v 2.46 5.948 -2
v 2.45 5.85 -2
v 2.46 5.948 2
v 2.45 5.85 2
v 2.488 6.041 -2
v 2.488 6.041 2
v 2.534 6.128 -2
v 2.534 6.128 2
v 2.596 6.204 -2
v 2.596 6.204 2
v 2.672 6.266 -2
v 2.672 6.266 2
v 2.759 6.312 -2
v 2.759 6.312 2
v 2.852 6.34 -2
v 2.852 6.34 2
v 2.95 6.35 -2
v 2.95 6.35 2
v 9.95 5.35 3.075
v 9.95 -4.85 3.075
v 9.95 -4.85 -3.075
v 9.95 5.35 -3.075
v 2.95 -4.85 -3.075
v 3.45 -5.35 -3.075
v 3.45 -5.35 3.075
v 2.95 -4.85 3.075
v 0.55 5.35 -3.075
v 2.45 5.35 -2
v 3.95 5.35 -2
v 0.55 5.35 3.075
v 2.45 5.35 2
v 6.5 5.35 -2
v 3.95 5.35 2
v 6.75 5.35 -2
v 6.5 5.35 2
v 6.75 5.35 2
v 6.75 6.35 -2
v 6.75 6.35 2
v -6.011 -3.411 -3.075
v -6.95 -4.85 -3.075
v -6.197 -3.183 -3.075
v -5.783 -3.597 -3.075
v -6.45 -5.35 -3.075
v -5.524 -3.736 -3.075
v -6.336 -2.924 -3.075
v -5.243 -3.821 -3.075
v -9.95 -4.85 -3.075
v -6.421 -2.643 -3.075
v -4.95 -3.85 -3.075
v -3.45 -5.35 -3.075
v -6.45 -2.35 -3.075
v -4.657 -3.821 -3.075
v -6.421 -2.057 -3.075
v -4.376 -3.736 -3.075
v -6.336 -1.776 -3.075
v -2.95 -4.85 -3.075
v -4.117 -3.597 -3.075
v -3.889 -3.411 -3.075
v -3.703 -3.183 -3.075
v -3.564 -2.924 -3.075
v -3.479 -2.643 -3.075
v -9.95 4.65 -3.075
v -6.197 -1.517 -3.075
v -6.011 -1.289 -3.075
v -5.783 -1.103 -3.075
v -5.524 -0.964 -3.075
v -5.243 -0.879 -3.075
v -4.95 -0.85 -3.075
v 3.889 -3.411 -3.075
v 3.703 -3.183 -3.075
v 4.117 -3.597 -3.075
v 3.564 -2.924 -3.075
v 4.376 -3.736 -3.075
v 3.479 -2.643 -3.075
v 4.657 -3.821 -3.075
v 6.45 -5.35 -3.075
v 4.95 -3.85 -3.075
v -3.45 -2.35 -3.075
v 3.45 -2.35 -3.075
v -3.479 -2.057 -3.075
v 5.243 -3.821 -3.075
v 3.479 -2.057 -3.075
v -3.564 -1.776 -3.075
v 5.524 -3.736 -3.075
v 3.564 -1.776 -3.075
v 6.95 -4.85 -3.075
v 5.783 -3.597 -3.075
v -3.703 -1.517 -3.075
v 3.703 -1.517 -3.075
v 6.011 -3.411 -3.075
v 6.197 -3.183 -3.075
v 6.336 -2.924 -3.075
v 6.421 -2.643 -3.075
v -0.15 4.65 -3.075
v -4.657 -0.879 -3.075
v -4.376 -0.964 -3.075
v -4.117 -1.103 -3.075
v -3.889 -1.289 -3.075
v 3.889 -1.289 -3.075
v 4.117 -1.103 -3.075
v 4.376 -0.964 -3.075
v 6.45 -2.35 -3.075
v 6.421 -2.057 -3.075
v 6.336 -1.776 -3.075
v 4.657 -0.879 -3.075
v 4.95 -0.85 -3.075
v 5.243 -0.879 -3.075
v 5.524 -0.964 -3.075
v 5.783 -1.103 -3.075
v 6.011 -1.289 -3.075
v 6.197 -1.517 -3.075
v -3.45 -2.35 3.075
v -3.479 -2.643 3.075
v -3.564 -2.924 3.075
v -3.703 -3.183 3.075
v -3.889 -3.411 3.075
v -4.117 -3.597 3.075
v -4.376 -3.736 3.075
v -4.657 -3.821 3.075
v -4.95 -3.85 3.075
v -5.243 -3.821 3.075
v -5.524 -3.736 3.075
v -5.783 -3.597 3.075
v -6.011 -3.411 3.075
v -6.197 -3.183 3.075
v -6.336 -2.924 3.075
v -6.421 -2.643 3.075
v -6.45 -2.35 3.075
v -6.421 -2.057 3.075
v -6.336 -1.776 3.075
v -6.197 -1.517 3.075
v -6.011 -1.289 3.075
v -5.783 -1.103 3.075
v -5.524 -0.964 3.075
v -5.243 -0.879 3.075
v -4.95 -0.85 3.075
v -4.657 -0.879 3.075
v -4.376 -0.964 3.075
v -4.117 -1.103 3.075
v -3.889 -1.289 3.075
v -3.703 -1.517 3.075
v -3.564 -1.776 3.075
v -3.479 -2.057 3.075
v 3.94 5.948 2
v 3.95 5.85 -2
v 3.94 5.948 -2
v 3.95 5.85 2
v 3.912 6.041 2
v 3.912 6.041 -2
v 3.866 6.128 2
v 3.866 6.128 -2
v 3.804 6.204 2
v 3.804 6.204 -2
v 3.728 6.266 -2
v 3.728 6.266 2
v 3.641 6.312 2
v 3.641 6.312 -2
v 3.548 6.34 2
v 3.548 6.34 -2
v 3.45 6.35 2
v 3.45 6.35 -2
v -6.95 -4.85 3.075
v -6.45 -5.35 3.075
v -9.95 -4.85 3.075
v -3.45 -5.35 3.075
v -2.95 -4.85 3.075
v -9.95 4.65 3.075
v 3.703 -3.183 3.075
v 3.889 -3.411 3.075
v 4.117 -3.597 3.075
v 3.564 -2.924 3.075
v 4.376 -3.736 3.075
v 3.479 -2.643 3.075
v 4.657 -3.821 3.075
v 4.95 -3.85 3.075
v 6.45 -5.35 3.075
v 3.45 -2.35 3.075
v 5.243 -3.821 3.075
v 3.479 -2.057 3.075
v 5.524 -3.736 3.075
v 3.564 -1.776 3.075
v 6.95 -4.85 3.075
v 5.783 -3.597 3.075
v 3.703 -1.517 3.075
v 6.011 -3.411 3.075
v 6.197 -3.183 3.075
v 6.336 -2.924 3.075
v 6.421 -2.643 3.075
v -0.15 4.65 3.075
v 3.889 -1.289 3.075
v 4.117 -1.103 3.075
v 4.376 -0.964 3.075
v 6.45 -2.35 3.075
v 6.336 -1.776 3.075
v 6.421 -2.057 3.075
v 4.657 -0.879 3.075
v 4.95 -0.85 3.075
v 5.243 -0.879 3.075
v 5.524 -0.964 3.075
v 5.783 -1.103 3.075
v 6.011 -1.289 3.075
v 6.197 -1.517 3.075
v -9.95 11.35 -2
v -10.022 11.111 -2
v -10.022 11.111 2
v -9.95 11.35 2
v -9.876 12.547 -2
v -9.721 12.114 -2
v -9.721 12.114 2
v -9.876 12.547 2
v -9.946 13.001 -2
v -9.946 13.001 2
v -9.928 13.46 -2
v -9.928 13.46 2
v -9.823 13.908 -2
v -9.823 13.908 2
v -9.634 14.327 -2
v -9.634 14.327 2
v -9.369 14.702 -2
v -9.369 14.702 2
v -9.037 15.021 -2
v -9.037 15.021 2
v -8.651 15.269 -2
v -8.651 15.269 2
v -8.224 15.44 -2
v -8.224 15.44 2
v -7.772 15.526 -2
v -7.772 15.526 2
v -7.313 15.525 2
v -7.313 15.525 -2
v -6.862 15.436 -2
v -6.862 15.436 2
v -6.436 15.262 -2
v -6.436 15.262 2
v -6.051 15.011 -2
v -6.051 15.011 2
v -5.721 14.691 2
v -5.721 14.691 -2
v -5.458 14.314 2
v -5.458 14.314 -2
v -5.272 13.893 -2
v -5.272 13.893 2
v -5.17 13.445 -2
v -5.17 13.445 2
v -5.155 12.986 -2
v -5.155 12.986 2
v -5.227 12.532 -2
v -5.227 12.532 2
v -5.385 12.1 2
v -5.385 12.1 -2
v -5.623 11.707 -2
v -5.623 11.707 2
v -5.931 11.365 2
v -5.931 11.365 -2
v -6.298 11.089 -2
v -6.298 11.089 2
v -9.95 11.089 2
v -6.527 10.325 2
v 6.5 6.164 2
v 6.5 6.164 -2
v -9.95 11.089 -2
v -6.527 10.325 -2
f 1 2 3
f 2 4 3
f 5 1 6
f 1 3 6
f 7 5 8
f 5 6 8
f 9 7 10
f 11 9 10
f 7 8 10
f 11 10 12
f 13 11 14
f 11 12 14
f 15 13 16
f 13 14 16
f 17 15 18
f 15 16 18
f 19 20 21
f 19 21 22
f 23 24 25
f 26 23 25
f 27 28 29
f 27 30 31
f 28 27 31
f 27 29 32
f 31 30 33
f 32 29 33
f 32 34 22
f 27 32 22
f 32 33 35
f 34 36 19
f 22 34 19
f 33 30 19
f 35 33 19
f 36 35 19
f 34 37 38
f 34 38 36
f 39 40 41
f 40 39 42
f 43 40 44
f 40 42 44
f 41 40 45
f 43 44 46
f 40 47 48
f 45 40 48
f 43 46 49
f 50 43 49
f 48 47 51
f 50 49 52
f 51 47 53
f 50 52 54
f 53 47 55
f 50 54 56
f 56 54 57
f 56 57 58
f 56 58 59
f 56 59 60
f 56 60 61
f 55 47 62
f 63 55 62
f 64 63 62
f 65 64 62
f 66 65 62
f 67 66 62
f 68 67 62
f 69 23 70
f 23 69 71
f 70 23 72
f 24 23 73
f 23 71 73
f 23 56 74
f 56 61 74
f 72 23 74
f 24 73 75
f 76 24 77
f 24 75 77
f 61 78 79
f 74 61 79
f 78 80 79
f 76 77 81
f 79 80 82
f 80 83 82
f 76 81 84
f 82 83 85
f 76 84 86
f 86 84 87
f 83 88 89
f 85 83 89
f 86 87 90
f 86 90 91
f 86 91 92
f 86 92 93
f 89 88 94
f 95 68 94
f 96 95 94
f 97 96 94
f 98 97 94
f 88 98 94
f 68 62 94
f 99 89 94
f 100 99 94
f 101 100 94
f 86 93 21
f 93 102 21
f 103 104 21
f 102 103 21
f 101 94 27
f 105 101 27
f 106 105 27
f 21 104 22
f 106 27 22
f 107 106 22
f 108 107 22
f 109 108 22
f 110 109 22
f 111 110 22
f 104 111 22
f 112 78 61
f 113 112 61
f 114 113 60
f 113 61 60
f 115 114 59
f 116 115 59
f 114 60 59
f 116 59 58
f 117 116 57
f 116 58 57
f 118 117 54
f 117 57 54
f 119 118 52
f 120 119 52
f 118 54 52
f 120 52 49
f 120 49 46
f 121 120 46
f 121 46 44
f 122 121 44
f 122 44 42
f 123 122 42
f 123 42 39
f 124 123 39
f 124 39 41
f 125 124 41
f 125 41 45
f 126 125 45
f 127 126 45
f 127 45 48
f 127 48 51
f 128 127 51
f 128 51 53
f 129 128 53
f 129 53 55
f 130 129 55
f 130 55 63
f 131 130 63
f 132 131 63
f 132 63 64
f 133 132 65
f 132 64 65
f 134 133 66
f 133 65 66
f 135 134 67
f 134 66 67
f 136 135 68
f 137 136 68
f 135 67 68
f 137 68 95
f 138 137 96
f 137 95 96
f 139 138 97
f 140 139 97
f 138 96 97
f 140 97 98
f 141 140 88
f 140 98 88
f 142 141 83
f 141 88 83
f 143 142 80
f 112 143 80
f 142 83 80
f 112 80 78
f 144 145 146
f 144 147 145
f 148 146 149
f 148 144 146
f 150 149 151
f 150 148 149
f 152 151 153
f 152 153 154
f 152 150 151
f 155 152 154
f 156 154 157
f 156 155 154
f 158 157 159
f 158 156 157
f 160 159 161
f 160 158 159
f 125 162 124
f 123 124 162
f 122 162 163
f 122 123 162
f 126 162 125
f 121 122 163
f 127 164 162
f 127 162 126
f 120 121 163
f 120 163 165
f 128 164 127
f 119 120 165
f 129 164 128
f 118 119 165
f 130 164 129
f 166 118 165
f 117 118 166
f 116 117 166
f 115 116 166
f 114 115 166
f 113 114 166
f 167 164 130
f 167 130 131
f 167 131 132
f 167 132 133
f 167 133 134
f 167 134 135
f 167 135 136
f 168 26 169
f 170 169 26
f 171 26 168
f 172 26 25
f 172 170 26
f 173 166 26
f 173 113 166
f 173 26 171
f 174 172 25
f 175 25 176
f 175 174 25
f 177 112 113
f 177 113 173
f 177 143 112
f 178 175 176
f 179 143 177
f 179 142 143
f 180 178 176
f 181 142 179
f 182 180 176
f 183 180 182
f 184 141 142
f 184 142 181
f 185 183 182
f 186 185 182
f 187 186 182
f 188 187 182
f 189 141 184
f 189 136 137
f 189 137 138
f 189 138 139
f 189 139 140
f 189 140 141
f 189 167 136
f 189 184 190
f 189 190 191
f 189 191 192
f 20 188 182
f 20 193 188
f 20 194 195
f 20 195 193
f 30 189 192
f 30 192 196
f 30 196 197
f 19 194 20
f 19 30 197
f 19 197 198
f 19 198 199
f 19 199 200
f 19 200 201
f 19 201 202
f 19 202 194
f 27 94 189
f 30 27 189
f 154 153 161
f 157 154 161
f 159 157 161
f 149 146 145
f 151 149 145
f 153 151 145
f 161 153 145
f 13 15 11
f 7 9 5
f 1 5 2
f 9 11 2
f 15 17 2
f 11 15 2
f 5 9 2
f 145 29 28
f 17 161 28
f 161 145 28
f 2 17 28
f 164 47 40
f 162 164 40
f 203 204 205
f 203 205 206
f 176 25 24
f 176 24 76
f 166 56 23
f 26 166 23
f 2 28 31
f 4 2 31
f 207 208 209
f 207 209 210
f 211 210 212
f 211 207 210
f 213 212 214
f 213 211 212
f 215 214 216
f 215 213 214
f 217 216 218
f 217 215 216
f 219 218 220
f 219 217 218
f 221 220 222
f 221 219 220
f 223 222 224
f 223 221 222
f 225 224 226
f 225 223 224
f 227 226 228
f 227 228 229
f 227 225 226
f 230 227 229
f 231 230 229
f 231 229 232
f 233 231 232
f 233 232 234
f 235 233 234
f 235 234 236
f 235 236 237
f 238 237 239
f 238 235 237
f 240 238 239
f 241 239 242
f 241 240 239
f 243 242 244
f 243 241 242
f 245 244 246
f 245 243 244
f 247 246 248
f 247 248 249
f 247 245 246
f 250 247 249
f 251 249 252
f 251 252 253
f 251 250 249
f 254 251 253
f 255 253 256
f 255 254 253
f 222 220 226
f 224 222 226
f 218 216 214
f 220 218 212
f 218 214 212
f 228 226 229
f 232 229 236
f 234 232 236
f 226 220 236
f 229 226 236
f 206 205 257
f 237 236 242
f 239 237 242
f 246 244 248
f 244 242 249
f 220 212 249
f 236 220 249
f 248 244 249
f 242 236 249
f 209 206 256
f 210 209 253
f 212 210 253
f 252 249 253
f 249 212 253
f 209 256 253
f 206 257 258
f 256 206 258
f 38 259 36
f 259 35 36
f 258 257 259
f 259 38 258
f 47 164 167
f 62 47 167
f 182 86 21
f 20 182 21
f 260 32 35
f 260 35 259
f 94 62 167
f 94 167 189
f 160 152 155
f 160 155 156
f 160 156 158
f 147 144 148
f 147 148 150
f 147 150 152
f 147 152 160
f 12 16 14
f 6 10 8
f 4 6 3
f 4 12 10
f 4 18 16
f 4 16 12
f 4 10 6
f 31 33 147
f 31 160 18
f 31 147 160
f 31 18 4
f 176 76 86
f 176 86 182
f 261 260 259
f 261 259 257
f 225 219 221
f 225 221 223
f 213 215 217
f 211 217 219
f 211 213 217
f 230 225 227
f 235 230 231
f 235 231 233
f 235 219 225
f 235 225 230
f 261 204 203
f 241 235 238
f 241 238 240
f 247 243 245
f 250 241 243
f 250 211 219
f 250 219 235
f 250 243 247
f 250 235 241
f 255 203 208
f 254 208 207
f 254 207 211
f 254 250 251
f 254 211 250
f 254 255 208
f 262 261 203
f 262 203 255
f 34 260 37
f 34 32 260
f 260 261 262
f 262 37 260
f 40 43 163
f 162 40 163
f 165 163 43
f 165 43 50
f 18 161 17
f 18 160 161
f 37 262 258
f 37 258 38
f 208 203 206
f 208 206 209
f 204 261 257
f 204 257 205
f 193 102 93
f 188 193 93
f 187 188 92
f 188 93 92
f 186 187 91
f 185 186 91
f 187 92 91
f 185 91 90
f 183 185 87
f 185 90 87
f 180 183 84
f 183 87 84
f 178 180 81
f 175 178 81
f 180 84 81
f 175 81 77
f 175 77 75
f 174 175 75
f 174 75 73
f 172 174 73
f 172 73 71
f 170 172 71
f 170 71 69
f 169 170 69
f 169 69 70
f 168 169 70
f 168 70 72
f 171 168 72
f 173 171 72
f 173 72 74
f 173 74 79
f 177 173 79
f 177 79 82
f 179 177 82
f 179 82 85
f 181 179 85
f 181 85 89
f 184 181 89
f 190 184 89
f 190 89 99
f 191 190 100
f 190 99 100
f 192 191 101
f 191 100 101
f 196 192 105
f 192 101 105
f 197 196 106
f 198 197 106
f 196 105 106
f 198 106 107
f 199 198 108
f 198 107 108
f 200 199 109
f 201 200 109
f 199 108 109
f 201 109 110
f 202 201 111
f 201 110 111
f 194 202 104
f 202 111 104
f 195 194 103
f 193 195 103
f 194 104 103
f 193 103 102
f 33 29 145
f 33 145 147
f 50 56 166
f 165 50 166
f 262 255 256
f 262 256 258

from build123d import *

# Parameters (mm, degrees)
F0_W          = 19.9
F0_H          = 10.7
F1_DEPTH      = 3.075
F1_DEPTH_BACK = 3.075
F2_W          = 1.5
F2_H          = 4
F3_DEPTH      = 1
F4_R          = 0.5
F6_DEPTH      = 4
F7_W          = 10.5
F7_H          = 0.7
F7_W_2        = 3.5
F7_H_2        = 0.5
F7_W_3        = 6.9
F7_R          = 1.5
F8_DEPTH      = 25
F9_SIZE       = 0.69999
F10_SIZE      = 0.49999


# Not quite as in the source:
# - a fillet or chamfer is up to 0.001 mm smaller than in the source, because OpenCascade refuses the exact size


with BuildPart() as f1:
    # F0 (on Top) → F1 (new body, two sides)
    with BuildSketch(Plane.XY) as f1_sk:
        Rectangle(F0_W, F0_H)
    extrude(amount=F1_DEPTH)
    extrude(f1_sk.sketch, amount=-F1_DEPTH_BACK)

    # F2 (on face) → F3 (join)
    with BuildSketch(Plane(origin=(0, 5.35, 0), x_dir=(-1, 0, 0), z_dir=(0, 1, 0))):
        with Locations((-3.2, 0)):
            Rectangle(F2_W, F2_H)
    extrude(amount=F3_DEPTH)

    # F4
    f4_edges = [f1.edges().sort_by_distance(p)[0] for p in [
        (2.45, 6.35, 0),
        (3.95, 6.35, 0),
    ]]
    fillet(f4_edges, radius=F4_R)

    # F5 (on face) → F6 (join)
    with BuildSketch(Plane(origin=(0, 0, -2), x_dir=(1, 0, 0), z_dir=(0, 0, -1))):
        with BuildLine():
            Line((6.75, -6.35), (6.75, -5.35))
            Line((6.75, -5.35), (6.5, -5.35))
            Line((6.5, -5.35), (6.5, -6.1638856134))
            Line((6.5, -6.1638856134), (-9.95, -11.089035314))
            Line((-9.95, -11.089035314), (-10.021705391, -11.110503994))
            Line((-10.021705391, -11.110503994), (-9.95, -11.35))
            Line((-9.95, -11.35), (-9.7212332774, -12.1140808536))
            ThreePointArc((-9.7212332774, -12.1140808536), (-6.8616282462, -15.4358597688), (-6.297976785, -11.08915376))
            Line((-6.297976785, -11.08915376), (-6.5267435076, -10.3250729065))
            Line((-6.5267435076, -10.3250729065), (6.75, -6.35))
        make_face()
    extrude(amount=-F6_DEPTH)

    # F7 (on face) → F8 (cut)
    with BuildSketch(Plane(origin=(0, 0, -3.075), x_dir=(1, 0, 0), z_dir=(0, 0, -1))):
        with Locations((-4.7, -5)):
            Rectangle(F7_W, F7_H)
        with Locations((-8.2, 5.1)):
            Rectangle(F7_W_2, F7_H_2)
        with Locations((8.2, 5.1)):
            Rectangle(F7_W_2, F7_H_2)
        with Locations((0, 5.1)):
            Rectangle(F7_W_3, F7_H_2)
        with Locations((4.95, 2.35)):
            Circle(F7_R)
        with Locations((-4.95, 2.35)):
            Circle(F7_R)
    extrude(amount=-F8_DEPTH, mode=Mode.SUBTRACT)

    # F9 (size 0.7 in the source; OpenCascade refuses exactly that, so slightly less here)
    f9_edges = [f1.edges().sort_by_distance(p)[0] for p in [
        (0.55, 4.65, 0),
    ]]
    chamfer(f9_edges, length=F9_SIZE)

    # F10 (size 0.5 in the source; OpenCascade refuses exactly that, so slightly less here)
    f10_edges = [f1.edges().sort_by_distance(p)[0] for p in [
        (6.45, -4.85, 0),
        (3.45, -4.85, 0),
        (-3.45, -4.85, 0),
        (-6.45, -4.85, 0),
    ]]
    chamfer(f10_edges, length=F10_SIZE)


solid = f1.part
